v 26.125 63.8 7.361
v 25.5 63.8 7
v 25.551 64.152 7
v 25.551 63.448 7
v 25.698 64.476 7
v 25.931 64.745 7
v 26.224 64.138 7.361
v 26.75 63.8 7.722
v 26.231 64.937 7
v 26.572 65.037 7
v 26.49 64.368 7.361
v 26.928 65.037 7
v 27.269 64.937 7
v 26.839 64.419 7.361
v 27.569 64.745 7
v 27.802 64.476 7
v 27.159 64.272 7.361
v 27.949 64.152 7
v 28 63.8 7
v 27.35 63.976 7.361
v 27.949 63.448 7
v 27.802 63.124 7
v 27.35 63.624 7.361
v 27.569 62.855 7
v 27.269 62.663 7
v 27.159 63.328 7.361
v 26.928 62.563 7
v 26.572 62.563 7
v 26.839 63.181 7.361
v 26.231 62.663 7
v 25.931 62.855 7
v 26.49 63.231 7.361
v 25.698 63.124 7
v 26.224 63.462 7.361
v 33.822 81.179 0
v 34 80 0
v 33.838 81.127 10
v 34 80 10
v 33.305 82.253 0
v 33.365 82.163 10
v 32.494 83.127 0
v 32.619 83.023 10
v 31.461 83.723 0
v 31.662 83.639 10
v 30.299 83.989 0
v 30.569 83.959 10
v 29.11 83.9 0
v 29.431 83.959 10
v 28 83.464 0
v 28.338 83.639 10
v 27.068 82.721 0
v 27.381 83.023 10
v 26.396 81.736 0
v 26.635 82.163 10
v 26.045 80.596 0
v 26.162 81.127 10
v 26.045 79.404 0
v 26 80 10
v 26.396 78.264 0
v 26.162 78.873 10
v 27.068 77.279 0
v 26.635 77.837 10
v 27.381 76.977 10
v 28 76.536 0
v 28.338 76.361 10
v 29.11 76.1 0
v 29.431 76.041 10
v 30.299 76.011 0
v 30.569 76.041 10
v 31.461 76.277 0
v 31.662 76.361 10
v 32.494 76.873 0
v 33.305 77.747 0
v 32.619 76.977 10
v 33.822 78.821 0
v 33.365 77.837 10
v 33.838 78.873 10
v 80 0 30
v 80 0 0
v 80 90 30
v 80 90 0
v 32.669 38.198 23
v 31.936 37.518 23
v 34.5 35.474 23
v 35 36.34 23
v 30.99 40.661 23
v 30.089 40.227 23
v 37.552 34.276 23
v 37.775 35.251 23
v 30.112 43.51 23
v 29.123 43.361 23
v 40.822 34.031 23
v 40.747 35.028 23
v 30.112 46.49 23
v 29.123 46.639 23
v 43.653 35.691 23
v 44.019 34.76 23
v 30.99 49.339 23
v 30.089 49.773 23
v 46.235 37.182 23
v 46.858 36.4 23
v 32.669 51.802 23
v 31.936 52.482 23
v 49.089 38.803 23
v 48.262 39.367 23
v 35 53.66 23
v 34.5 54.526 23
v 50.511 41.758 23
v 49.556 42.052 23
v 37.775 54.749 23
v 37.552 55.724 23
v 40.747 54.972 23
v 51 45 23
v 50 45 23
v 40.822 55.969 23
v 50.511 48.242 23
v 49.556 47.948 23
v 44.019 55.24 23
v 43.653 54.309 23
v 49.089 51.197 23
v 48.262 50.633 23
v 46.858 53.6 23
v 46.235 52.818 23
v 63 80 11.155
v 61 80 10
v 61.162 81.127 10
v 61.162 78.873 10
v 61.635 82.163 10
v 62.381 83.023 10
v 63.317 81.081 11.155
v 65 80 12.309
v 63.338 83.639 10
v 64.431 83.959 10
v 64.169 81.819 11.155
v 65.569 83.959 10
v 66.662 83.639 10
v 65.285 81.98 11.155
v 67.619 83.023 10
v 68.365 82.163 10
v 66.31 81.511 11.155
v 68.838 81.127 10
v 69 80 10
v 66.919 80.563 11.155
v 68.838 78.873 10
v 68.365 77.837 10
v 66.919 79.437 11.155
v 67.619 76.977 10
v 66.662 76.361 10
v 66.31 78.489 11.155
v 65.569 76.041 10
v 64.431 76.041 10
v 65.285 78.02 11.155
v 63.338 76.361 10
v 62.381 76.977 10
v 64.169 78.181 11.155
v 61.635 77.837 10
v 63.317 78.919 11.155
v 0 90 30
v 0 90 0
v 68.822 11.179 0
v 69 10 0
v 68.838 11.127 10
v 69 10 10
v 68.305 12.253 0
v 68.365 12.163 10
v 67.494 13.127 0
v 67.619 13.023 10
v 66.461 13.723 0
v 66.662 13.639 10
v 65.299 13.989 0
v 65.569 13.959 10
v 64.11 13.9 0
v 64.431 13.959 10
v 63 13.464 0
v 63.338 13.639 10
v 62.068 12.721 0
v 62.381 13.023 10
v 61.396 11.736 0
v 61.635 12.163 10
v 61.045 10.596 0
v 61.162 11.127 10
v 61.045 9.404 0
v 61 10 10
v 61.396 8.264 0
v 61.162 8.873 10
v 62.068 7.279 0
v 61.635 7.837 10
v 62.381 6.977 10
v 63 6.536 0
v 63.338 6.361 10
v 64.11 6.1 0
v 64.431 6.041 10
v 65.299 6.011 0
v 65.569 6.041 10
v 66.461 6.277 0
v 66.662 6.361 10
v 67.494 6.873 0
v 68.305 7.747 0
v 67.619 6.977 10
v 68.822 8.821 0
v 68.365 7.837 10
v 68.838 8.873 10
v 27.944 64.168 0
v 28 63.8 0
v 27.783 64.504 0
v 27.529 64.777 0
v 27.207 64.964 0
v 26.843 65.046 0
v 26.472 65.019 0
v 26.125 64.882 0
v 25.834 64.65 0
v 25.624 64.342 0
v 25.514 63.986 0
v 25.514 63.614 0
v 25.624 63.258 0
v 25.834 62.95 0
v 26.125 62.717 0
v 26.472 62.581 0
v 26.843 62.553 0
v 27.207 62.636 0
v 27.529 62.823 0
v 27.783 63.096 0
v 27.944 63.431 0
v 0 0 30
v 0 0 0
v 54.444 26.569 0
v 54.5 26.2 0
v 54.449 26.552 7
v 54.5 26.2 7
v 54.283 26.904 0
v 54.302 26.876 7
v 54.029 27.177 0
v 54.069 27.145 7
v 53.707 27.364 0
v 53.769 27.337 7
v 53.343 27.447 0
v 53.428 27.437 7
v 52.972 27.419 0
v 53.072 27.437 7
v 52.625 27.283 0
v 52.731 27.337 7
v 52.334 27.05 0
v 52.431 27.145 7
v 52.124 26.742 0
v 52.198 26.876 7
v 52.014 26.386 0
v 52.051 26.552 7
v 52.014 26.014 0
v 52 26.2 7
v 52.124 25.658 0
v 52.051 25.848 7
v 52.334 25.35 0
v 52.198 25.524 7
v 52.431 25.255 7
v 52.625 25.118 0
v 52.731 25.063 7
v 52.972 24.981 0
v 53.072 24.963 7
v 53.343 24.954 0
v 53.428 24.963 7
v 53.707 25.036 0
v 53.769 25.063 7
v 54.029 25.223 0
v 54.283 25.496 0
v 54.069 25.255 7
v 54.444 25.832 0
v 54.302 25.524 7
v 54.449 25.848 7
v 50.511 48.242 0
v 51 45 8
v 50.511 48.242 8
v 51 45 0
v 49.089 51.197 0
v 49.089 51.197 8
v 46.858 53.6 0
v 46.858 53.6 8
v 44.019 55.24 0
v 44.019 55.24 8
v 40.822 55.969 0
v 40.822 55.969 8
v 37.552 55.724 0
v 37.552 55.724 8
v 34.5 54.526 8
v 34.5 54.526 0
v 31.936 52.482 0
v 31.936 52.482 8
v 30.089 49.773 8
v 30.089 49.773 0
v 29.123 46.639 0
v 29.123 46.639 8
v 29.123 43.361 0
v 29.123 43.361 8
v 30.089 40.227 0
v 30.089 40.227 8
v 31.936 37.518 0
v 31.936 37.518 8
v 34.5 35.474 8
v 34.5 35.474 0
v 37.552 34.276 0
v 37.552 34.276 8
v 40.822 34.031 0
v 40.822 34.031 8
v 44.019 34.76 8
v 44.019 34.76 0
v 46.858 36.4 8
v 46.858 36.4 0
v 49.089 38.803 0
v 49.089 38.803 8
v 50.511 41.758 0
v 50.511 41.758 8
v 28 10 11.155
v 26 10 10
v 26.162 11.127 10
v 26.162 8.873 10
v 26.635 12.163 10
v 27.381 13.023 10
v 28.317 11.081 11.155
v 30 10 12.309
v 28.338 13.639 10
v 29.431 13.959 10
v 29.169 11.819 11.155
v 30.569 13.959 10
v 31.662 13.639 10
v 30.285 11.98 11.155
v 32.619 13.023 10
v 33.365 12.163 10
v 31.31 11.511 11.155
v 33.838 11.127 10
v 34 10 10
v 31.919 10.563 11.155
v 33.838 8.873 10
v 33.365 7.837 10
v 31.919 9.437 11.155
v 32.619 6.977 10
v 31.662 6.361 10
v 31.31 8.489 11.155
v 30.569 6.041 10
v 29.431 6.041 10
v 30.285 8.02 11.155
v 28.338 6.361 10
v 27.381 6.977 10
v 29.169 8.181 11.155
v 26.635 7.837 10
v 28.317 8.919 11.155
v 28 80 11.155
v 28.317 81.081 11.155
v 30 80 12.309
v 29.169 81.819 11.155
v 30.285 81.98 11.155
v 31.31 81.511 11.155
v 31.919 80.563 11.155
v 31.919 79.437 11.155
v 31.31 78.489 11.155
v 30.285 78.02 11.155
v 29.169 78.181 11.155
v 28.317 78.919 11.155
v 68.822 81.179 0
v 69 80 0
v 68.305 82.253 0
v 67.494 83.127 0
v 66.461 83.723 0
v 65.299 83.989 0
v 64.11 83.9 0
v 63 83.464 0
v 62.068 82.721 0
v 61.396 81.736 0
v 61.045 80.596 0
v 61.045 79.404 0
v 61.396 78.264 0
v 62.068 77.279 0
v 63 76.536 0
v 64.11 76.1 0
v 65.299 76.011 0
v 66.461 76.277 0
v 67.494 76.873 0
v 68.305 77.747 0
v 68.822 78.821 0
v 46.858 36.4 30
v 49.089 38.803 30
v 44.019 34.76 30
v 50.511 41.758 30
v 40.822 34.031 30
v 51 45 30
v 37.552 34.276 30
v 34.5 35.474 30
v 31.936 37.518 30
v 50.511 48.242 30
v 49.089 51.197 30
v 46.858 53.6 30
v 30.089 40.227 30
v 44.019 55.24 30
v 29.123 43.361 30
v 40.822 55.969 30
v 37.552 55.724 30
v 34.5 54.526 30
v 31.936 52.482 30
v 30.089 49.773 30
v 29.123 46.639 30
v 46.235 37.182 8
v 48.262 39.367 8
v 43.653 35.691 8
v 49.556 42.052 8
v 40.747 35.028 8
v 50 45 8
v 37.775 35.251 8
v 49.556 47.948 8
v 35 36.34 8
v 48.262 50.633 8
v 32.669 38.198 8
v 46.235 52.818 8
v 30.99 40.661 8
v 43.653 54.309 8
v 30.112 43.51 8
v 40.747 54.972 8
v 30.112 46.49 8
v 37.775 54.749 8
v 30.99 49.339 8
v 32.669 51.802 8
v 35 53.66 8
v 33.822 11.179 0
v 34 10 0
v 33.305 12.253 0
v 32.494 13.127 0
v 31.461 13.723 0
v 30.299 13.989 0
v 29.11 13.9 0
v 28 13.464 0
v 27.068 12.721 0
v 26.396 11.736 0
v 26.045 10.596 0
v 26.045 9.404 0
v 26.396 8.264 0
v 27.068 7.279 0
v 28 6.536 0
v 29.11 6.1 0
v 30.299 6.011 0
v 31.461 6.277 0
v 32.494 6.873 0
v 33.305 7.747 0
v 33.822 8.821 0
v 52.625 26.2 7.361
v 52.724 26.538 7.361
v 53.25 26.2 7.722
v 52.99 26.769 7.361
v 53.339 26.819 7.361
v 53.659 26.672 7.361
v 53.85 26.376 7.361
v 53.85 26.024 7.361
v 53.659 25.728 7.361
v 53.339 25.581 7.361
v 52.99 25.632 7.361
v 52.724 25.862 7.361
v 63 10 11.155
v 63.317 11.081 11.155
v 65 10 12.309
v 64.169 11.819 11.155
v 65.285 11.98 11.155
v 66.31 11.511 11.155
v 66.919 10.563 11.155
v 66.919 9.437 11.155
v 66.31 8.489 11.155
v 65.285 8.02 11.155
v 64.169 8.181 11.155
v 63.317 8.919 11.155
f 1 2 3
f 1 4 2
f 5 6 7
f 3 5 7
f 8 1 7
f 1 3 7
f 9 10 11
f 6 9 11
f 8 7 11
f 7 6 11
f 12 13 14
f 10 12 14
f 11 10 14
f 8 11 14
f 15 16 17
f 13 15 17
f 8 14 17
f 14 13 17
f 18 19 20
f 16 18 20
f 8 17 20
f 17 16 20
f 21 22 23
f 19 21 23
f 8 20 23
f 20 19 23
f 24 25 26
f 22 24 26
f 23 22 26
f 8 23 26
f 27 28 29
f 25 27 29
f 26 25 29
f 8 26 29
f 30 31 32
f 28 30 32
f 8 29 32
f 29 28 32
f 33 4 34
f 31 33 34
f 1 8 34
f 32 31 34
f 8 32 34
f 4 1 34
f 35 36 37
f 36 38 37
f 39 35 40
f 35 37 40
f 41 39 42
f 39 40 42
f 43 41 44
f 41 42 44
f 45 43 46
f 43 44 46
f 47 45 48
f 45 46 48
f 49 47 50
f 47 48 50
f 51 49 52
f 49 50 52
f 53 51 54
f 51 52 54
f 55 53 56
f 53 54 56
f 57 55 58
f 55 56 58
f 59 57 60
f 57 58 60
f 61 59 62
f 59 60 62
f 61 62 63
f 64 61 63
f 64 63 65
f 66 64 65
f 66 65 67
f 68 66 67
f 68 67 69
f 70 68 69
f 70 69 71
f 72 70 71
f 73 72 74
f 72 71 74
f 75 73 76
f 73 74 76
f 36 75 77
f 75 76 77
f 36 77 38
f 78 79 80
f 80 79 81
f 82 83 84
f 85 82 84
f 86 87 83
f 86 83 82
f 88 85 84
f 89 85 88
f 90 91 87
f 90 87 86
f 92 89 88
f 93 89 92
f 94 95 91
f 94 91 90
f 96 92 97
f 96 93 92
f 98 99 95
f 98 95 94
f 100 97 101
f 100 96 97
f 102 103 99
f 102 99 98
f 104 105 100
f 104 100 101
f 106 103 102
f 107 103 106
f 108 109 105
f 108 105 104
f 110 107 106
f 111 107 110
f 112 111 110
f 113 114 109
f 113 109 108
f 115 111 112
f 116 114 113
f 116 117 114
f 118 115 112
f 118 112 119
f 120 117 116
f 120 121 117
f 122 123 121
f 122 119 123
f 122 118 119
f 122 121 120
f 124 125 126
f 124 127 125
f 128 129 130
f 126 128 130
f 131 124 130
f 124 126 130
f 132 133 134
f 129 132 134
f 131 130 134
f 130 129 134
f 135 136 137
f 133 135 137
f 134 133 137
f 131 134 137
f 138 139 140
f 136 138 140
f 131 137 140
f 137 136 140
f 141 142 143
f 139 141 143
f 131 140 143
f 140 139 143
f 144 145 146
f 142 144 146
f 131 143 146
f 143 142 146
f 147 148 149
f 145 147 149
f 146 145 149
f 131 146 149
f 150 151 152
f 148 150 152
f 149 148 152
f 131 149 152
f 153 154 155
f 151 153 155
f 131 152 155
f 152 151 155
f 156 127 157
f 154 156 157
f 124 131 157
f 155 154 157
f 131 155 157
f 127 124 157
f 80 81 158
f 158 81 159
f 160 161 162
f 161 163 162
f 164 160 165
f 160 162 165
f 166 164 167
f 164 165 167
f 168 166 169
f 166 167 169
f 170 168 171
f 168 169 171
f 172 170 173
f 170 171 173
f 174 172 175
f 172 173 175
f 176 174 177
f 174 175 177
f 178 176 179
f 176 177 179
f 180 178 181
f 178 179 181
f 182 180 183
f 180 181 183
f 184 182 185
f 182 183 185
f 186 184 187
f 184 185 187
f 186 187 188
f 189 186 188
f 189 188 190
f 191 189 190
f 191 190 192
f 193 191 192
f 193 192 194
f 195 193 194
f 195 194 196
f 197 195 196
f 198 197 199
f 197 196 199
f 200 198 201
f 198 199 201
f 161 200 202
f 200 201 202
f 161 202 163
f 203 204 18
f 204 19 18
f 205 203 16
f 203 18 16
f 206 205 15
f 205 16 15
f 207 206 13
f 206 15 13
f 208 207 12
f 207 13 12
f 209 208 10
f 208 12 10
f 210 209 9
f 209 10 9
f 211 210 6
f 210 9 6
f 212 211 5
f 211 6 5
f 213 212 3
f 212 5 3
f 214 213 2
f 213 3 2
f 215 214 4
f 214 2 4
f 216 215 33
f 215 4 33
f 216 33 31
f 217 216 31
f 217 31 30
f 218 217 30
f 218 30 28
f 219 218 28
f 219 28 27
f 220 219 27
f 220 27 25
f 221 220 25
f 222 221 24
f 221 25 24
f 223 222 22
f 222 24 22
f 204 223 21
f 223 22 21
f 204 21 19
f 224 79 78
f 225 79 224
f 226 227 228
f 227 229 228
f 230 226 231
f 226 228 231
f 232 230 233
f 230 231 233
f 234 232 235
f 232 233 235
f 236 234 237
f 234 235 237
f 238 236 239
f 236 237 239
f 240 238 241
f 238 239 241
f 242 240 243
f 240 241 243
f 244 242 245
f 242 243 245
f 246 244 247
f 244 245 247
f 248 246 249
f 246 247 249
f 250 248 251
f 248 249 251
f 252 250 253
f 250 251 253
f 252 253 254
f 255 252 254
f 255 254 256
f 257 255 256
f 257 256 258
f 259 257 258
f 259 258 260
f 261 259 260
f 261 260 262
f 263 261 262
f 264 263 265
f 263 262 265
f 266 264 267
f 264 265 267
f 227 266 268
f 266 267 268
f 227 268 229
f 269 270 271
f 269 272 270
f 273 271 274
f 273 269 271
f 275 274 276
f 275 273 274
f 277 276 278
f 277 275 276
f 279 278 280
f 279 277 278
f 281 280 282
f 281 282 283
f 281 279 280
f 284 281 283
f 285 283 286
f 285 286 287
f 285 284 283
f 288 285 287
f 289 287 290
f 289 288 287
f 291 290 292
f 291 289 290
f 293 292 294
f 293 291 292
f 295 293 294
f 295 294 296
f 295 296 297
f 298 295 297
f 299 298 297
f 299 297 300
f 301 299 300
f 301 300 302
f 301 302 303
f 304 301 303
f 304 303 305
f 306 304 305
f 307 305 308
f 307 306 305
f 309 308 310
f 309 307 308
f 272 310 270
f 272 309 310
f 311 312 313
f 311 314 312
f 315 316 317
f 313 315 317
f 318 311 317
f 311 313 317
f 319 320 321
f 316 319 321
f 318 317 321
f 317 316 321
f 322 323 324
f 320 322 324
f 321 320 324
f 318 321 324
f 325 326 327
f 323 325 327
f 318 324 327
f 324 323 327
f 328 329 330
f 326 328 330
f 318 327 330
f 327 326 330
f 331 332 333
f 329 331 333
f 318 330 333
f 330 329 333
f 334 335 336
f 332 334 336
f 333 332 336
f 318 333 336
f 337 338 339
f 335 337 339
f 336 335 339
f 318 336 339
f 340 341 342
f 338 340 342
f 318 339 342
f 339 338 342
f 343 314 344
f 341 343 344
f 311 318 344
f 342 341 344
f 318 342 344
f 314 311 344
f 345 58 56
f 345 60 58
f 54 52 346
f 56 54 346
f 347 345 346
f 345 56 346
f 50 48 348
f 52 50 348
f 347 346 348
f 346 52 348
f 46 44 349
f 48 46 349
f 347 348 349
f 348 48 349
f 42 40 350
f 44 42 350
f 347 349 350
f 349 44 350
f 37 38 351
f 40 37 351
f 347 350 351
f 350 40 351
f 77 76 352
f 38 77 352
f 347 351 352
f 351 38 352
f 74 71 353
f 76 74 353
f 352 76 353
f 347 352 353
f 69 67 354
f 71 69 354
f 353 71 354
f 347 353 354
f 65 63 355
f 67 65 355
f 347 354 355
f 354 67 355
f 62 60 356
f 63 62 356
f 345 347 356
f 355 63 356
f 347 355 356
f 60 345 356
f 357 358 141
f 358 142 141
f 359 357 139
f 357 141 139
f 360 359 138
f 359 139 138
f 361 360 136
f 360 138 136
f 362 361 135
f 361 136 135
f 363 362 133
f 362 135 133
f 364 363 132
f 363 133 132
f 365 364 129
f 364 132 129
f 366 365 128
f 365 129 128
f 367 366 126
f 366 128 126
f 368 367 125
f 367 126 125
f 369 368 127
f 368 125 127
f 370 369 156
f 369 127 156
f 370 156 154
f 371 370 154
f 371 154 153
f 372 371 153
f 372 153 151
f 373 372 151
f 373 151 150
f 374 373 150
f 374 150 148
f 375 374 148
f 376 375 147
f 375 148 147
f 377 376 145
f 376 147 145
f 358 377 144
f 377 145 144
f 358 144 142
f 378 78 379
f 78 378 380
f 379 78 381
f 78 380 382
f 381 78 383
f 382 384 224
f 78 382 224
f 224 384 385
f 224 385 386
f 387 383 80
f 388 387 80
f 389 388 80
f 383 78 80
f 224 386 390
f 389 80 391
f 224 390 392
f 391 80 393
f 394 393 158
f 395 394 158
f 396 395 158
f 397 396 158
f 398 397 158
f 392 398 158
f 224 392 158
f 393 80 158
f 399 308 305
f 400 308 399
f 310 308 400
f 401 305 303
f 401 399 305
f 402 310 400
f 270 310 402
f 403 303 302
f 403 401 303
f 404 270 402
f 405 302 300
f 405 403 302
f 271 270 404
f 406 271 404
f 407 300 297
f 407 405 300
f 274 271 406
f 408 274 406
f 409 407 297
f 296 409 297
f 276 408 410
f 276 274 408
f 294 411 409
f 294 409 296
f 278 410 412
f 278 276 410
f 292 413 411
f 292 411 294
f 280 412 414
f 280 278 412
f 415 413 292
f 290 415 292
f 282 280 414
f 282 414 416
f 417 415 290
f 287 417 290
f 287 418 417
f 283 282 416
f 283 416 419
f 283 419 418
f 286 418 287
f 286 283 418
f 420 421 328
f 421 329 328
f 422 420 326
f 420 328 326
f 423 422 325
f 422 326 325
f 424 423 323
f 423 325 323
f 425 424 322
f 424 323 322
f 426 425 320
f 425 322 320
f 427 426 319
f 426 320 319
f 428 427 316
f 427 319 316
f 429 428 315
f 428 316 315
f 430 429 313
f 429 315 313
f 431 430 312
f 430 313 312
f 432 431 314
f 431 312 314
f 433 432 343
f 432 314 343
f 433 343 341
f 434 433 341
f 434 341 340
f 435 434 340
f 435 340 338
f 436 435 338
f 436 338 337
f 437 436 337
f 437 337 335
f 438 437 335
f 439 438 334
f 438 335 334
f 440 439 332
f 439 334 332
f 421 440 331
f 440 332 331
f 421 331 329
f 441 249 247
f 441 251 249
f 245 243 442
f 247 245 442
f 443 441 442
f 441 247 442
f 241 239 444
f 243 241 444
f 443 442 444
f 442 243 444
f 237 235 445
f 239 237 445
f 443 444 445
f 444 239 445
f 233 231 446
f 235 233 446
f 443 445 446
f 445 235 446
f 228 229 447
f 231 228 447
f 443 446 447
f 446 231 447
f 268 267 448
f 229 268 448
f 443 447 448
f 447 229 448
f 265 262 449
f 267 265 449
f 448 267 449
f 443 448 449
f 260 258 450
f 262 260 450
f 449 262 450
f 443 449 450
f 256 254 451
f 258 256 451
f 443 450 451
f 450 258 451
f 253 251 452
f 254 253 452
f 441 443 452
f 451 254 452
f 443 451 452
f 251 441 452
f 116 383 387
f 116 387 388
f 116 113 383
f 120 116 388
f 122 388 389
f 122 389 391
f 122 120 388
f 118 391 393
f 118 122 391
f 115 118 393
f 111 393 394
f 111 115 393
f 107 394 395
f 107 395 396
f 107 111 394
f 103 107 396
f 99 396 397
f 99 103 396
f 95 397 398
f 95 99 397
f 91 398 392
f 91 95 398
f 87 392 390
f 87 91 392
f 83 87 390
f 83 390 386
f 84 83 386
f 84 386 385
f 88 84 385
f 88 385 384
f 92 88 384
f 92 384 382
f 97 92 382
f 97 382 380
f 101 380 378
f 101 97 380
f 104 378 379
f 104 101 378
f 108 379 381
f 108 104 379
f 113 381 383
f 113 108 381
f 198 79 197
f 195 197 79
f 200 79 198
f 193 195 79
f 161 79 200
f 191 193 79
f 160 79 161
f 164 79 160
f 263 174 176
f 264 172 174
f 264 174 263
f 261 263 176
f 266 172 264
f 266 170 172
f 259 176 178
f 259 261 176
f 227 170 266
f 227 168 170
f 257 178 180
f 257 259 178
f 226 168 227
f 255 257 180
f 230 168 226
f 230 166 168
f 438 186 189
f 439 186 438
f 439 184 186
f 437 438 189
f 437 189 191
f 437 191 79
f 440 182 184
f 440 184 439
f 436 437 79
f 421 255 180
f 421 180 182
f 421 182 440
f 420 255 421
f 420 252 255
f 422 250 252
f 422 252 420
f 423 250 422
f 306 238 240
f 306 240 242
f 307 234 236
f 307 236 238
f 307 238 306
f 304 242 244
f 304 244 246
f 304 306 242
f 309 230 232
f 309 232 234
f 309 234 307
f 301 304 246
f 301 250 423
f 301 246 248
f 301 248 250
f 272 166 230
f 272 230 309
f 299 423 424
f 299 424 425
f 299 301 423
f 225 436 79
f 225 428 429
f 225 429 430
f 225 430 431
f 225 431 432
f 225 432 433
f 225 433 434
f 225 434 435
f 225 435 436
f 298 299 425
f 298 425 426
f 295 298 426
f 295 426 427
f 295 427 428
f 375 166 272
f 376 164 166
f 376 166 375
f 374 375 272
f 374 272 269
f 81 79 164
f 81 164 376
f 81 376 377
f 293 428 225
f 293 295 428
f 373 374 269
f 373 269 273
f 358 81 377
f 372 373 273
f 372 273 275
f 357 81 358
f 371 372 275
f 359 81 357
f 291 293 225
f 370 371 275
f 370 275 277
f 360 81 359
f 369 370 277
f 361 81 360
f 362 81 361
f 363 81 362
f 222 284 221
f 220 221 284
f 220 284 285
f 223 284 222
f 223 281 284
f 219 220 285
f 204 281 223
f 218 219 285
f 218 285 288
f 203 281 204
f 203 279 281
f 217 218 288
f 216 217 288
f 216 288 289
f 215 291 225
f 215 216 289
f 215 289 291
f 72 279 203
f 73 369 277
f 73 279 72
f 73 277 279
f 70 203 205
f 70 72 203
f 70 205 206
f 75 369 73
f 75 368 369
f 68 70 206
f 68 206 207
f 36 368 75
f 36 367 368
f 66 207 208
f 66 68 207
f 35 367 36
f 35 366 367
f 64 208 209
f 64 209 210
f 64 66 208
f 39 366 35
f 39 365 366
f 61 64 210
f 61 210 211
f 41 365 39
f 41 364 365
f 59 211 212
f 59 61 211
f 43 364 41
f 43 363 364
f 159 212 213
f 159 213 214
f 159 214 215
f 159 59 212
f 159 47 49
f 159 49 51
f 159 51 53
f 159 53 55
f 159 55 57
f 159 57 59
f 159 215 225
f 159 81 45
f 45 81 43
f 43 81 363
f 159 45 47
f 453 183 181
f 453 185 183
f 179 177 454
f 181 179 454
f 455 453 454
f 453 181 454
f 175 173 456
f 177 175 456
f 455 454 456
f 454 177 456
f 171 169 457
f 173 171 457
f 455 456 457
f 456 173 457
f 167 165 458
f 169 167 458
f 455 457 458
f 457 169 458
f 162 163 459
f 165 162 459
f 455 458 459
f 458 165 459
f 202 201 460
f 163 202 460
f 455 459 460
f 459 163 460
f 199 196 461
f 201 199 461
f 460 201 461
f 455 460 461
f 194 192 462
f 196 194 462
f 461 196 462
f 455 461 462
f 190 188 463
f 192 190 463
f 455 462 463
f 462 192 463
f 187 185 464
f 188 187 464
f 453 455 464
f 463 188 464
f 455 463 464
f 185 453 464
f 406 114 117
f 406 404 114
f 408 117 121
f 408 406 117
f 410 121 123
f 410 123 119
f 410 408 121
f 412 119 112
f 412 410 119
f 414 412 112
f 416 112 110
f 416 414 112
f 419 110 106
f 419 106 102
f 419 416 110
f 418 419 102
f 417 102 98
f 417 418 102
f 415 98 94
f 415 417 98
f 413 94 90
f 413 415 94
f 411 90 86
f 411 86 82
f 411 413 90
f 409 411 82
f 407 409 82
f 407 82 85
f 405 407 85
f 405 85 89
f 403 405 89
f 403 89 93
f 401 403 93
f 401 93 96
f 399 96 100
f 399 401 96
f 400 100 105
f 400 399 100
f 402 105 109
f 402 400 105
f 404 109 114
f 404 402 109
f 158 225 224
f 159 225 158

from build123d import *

# Parameters (mm, degrees)
SKETCH1_W                      = 80
SKETCH1_H                      = 90
BOSS_EXTRUDE1_DEPTH            = 30
F_2_5_2_5_DIAMETER_HOLE1_D     = 2.5
F_2_5_2_5_DIAMETER_HOLE1_DEPTH = 7
F_2_5_2_5_DIAMETER_HOLE1_TIP   = 0.721687836
F_8_0_8_DIAMETER_HOLE1_D       = 8
F_8_0_8_DIAMETER_HOLE1_DEPTH   = 10
F_8_0_8_DIAMETER_HOLE1_TIP     = 2.309401077


with BuildPart() as part:
    # Sketch1 → Boss-Extrude1 (new body)
    with BuildSketch(Plane(origin=(0, 0, 0), x_dir=(-1, 0, 0), z_dir=(0, 0, -1))):
        with Locations((-40, 45)):
            Rectangle(SKETCH1_W, SKETCH1_H)
    extrude(amount=-BOSS_EXTRUDE1_DEPTH)

    # Sketch2 → Cut-Revolve1 (revolve, cut)
    with BuildSketch(Plane(origin=(0, 45, 0), x_dir=(-1, 0, 0), z_dir=(0, -1, 0)), mode=Mode.PRIVATE) as cut_revolve1_sk:
        Polygon((-29, 0), (-40, 0), (-40, -30), (-29, -30), (-29, -23), (-30, -23), (-30, -8), (-29, -8), align=None)
    revolve(cut_revolve1_sk.sketch.rotate(Axis((40, 45, 0), (0, 0, 1)), 180), axis=Axis((40, 45, 0), (0, 0, 1)), mode=Mode.SUBTRACT)

    # Ø2.5 (2.5) Diameter Hole1
    with Locations(Plane(origin=(0, 0, 0), x_dir=(-1, 0, 0), z_dir=(0, 0, -1))):
        with Locations((-26.75, 63.799933511), (-53.25, 26.200066489)):
            Hole(F_2_5_2_5_DIAMETER_HOLE1_D / 2, depth=F_2_5_2_5_DIAMETER_HOLE1_DEPTH)
            with Locations((0, 0, -(F_2_5_2_5_DIAMETER_HOLE1_DEPTH + F_2_5_2_5_DIAMETER_HOLE1_TIP / 2))):  # 120° drill point
                Cone(0, F_2_5_2_5_DIAMETER_HOLE1_D / 2, F_2_5_2_5_DIAMETER_HOLE1_TIP, mode=Mode.SUBTRACT)

    # Ø8.0 (8) Diameter Hole1
    with Locations(Plane(origin=(0, 0, 0), x_dir=(-1, 0, 0), z_dir=(0, 0, -1))):
        with Locations((-30, 10), (-30, 80), (-65, 10), (-65, 80)):
            Hole(F_8_0_8_DIAMETER_HOLE1_D / 2, depth=F_8_0_8_DIAMETER_HOLE1_DEPTH)
            with Locations((0, 0, -(F_8_0_8_DIAMETER_HOLE1_DEPTH + F_8_0_8_DIAMETER_HOLE1_TIP / 2))):  # 120° drill point
                Cone(0, F_8_0_8_DIAMETER_HOLE1_D / 2, F_8_0_8_DIAMETER_HOLE1_TIP, mode=Mode.SUBTRACT)


solid = part.part
